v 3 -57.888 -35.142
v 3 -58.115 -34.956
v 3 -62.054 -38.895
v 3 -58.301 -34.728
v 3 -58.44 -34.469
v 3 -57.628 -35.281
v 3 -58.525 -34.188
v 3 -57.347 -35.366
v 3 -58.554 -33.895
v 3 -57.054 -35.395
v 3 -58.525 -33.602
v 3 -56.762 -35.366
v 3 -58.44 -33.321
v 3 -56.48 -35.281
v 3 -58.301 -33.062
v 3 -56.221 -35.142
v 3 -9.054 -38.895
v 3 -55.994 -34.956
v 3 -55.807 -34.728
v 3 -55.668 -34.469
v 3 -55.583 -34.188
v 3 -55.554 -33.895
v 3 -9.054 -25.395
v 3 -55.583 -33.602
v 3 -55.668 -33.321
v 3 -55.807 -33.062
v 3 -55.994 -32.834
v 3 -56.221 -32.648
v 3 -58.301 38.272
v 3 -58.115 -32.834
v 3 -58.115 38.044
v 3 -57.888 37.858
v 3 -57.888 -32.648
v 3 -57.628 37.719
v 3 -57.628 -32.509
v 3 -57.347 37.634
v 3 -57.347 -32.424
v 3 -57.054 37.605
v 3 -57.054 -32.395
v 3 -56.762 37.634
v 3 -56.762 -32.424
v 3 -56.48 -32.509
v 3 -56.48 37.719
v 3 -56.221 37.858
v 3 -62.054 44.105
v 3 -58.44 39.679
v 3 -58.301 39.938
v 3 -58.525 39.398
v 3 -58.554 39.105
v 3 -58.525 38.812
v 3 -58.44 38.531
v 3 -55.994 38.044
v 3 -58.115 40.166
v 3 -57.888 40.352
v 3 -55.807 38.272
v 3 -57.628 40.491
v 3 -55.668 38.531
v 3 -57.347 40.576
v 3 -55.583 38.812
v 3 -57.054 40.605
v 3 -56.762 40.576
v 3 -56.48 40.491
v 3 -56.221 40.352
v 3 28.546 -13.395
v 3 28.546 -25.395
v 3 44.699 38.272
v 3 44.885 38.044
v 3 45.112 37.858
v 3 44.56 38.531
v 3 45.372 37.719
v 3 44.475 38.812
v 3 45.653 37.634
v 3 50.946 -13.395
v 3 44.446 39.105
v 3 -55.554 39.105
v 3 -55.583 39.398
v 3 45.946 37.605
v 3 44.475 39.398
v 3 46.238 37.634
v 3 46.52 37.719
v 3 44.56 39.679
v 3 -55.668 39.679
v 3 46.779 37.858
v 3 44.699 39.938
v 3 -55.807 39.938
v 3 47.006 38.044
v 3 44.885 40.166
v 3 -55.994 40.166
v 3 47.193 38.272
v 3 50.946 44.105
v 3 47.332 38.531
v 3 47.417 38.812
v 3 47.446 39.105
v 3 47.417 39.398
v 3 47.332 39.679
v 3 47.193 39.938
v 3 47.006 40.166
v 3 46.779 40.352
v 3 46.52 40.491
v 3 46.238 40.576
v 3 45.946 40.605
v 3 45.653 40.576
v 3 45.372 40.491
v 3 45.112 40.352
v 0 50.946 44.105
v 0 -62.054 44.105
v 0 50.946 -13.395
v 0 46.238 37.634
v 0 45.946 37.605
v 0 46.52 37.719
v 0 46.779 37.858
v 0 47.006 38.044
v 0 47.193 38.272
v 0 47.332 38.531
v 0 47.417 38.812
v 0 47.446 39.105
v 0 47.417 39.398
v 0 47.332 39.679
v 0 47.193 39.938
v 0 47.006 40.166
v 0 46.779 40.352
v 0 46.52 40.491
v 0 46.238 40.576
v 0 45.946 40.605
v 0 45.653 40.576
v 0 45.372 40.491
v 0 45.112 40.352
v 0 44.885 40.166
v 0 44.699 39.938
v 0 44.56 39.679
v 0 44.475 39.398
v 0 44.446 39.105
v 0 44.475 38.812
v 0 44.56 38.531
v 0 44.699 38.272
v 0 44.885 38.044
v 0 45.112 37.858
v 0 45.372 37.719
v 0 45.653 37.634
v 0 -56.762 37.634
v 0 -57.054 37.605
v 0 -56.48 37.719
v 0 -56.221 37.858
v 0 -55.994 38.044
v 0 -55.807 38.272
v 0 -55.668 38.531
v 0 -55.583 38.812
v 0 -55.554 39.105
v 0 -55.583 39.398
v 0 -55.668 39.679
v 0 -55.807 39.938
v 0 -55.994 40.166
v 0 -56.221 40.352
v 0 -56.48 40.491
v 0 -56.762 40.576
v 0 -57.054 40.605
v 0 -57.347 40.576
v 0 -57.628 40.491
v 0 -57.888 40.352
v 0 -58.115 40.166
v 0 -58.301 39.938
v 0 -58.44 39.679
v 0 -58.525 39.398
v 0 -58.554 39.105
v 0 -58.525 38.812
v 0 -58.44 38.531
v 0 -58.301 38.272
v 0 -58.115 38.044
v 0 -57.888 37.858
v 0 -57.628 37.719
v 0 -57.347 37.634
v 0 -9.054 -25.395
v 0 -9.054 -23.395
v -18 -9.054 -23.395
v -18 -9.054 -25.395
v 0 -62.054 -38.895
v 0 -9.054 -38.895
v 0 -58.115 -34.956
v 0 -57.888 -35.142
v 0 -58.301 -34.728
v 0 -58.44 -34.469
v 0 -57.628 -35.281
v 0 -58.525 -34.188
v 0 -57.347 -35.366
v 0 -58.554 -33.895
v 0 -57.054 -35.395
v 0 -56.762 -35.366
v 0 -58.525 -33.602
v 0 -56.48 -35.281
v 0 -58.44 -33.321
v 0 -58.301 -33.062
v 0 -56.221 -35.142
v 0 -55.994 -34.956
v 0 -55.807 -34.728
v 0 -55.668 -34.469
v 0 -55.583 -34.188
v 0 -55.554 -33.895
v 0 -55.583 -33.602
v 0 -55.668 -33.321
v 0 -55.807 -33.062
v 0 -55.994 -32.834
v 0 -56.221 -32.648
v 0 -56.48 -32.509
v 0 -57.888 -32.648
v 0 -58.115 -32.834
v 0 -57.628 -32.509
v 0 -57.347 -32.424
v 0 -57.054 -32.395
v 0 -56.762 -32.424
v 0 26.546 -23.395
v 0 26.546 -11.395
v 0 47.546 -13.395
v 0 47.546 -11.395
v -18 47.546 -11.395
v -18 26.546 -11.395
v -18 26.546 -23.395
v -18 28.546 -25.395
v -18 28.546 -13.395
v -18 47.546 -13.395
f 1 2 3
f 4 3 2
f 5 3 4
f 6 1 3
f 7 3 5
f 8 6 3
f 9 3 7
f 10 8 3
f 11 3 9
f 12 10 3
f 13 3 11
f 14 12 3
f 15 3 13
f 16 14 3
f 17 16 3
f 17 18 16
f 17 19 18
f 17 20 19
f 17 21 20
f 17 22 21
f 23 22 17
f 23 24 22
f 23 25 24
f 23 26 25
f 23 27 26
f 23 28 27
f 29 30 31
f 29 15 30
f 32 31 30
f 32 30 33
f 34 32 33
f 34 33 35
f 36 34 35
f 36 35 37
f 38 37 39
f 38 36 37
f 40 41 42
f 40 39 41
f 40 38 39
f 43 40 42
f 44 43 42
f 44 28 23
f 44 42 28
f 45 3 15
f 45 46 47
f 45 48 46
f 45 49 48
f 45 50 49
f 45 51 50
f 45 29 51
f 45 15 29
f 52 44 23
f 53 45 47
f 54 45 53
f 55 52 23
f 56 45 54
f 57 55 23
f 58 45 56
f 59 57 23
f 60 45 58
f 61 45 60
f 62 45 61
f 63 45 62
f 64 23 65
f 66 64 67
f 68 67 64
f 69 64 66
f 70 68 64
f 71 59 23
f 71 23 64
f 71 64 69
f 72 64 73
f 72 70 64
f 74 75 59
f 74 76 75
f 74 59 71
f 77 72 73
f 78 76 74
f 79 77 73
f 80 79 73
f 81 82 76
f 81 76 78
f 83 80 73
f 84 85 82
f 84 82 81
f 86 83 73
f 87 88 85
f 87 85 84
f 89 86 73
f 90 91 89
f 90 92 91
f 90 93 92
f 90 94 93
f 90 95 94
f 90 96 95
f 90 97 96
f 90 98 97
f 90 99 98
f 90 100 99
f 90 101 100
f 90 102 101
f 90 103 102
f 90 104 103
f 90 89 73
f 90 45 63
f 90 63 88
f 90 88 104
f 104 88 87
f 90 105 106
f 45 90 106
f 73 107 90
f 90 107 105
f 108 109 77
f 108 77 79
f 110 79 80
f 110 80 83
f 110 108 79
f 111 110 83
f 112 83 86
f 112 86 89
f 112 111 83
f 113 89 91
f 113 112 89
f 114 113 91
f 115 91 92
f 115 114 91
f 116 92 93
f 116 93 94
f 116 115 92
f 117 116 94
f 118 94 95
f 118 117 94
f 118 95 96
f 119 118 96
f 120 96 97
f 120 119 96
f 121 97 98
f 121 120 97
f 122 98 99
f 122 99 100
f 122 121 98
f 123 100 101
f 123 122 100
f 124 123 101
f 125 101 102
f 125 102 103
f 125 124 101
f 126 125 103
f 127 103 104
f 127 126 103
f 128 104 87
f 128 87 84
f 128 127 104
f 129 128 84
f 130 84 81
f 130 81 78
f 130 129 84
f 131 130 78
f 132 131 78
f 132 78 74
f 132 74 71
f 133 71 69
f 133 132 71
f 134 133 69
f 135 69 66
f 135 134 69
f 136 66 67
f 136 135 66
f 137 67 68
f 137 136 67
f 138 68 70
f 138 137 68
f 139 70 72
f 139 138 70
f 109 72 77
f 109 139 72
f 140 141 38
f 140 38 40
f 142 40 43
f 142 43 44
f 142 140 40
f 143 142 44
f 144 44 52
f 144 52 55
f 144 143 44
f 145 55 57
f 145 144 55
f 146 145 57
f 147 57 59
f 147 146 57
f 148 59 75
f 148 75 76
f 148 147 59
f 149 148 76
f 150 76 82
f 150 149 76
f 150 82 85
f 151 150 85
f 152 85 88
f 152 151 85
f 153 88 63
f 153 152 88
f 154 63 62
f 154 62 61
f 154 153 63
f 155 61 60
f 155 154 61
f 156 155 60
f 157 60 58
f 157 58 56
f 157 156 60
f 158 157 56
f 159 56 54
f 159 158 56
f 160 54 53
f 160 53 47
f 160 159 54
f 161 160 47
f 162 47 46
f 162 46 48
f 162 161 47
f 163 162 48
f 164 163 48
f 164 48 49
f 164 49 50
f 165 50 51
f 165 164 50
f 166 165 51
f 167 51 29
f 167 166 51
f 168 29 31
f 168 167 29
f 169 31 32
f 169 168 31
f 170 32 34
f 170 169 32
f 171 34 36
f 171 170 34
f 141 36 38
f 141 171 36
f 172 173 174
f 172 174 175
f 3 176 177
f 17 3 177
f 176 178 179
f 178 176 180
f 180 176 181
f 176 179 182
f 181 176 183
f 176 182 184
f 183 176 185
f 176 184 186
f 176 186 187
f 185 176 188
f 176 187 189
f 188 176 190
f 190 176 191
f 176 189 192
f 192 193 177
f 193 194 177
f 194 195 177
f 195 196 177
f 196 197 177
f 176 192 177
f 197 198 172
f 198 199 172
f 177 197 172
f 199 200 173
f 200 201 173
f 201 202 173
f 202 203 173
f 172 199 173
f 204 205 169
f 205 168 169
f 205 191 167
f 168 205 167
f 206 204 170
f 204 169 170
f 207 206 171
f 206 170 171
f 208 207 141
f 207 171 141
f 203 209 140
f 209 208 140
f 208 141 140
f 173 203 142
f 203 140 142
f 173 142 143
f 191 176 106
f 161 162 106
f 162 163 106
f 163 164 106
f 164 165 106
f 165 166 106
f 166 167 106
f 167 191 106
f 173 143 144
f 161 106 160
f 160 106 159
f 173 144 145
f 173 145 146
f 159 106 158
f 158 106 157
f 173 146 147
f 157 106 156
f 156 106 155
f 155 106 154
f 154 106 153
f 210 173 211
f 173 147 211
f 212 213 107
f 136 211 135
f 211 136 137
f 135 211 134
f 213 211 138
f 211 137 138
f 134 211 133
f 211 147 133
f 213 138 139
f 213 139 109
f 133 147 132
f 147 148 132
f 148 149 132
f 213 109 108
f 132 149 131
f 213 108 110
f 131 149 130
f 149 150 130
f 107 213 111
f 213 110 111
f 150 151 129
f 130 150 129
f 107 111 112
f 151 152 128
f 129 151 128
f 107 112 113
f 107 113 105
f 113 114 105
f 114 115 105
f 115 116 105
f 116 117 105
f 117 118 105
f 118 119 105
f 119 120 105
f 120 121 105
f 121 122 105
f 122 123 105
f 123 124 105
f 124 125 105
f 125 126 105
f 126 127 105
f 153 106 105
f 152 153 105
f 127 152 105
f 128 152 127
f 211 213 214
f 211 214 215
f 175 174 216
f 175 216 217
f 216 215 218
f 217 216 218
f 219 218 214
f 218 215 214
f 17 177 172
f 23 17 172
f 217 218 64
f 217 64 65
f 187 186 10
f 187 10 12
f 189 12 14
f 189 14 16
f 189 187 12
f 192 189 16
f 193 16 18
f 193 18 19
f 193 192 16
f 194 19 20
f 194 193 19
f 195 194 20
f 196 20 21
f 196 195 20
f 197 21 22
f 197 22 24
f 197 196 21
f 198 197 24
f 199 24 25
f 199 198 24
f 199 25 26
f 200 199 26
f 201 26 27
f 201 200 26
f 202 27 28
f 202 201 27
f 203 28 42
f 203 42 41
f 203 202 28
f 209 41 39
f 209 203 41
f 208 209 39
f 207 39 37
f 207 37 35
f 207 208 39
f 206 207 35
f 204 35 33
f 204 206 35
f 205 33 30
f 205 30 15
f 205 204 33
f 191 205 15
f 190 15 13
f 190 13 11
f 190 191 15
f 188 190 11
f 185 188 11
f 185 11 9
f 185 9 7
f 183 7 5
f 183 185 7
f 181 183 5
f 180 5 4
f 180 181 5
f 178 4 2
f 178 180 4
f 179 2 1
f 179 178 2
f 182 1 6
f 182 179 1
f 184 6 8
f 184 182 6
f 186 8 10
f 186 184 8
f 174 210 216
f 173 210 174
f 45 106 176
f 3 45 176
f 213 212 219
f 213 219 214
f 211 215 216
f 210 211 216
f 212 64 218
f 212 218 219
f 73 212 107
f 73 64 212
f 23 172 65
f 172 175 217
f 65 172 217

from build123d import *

# Parameters (mm, degrees)
SKETCH1_R                       = 1.5
BOSS_EXTRUDE1_DEPTH             = 3
BOSS_EXTRUDE2_DEPTH             = 18
BOSS_EXTRUDE2_DIRECTION_2_REACH = 78.19


with BuildPart() as part:
    # Sketch1 → Boss-Extrude1 (new body)
    with BuildSketch(Plane.YZ):
        Polygon((-9.054273726, -23.394917756), (28.546051212, -23.394917756), (28.546051212, -13.394917756), (47.945726274, -13.394917756), (50.945726274, -13.394917756), (50.945726274, 44.105082244), (-62.054273726, 44.105082244), (-62.054273726, -38.894917756), (-9.054273726, -38.894917756), align=None)
        with Locations(Location((-57.054273726, -33.894917756, 0), (0, 0, 270))):
            Circle(SKETCH1_R, mode=Mode.SUBTRACT)
        with Locations(Location((-57.054273726, 39.105082244, 0), (0, 0, 270))):
            Circle(SKETCH1_R, mode=Mode.SUBTRACT)
        with Locations(Location((45.945726274, 39.105082244, 0), (0, 0, 270))):
            Circle(SKETCH1_R, mode=Mode.SUBTRACT)
    extrude(amount=BOSS_EXTRUDE1_DEPTH)

    # Sketch2 → Boss-Extrude2 (add)
    with BuildSketch(Plane(origin=(0, 0, 0), x_dir=(0, -1, 0), z_dir=(-1, 0, 0))):
        Polygon((9.054273726, -23.394917756), (9.054273726, -25.394917756), (-28.546051212, -25.394917756), (-28.546051212, -23.394917756), (-28.546051212, -13.394917756), (-47.545726274, -13.394917756), (-47.545726274, -11.394917756), (-26.545726274, -11.394917756), (-26.545726274, -23.394917756), align=None)
    extrude(amount=BOSS_EXTRUDE2_DEPTH)

    # Boss-Extrude2 direction 2: up to this face of the body (flat: up to its plane)
    boss_extrude2_direction_2_end = Plane(part.part.faces().sort_by_distance((3, -9.750873795, 6.972989725))[0])
    # Sketch2 → Boss-Extrude2 direction 2 (add, up to the picked face)
    with BuildSketch(Plane(origin=(0, 0, 0), x_dir=(0, -1, 0), z_dir=(-1, 0, 0)), mode=Mode.PRIVATE) as boss_extrude2_direction_2_sk1:
        Polygon((9.054273726, -23.394917756), (9.054273726, -25.394917756), (-28.546051212, -25.394917756), (-28.546051212, -23.394917756), (-28.546051212, -13.394917756), (-47.545726274, -13.394917756), (-47.545726274, -11.394917756), (-26.545726274, -11.394917756), (-26.545726274, -23.394917756), align=None)
    boss_extrude2_direction_2_tool1 = split(extrude(boss_extrude2_direction_2_sk1.sketch, amount=-BOSS_EXTRUDE2_DIRECTION_2_REACH, mode=Mode.PRIVATE), bisect_by=boss_extrude2_direction_2_end, keep=Keep.BOTH, mode=Mode.PRIVATE)
    add(boss_extrude2_direction_2_tool1.solids().sort_by(Axis((0, -8.471216, -24.394918), (1, 0, 0)))[0])


solid = part.part
